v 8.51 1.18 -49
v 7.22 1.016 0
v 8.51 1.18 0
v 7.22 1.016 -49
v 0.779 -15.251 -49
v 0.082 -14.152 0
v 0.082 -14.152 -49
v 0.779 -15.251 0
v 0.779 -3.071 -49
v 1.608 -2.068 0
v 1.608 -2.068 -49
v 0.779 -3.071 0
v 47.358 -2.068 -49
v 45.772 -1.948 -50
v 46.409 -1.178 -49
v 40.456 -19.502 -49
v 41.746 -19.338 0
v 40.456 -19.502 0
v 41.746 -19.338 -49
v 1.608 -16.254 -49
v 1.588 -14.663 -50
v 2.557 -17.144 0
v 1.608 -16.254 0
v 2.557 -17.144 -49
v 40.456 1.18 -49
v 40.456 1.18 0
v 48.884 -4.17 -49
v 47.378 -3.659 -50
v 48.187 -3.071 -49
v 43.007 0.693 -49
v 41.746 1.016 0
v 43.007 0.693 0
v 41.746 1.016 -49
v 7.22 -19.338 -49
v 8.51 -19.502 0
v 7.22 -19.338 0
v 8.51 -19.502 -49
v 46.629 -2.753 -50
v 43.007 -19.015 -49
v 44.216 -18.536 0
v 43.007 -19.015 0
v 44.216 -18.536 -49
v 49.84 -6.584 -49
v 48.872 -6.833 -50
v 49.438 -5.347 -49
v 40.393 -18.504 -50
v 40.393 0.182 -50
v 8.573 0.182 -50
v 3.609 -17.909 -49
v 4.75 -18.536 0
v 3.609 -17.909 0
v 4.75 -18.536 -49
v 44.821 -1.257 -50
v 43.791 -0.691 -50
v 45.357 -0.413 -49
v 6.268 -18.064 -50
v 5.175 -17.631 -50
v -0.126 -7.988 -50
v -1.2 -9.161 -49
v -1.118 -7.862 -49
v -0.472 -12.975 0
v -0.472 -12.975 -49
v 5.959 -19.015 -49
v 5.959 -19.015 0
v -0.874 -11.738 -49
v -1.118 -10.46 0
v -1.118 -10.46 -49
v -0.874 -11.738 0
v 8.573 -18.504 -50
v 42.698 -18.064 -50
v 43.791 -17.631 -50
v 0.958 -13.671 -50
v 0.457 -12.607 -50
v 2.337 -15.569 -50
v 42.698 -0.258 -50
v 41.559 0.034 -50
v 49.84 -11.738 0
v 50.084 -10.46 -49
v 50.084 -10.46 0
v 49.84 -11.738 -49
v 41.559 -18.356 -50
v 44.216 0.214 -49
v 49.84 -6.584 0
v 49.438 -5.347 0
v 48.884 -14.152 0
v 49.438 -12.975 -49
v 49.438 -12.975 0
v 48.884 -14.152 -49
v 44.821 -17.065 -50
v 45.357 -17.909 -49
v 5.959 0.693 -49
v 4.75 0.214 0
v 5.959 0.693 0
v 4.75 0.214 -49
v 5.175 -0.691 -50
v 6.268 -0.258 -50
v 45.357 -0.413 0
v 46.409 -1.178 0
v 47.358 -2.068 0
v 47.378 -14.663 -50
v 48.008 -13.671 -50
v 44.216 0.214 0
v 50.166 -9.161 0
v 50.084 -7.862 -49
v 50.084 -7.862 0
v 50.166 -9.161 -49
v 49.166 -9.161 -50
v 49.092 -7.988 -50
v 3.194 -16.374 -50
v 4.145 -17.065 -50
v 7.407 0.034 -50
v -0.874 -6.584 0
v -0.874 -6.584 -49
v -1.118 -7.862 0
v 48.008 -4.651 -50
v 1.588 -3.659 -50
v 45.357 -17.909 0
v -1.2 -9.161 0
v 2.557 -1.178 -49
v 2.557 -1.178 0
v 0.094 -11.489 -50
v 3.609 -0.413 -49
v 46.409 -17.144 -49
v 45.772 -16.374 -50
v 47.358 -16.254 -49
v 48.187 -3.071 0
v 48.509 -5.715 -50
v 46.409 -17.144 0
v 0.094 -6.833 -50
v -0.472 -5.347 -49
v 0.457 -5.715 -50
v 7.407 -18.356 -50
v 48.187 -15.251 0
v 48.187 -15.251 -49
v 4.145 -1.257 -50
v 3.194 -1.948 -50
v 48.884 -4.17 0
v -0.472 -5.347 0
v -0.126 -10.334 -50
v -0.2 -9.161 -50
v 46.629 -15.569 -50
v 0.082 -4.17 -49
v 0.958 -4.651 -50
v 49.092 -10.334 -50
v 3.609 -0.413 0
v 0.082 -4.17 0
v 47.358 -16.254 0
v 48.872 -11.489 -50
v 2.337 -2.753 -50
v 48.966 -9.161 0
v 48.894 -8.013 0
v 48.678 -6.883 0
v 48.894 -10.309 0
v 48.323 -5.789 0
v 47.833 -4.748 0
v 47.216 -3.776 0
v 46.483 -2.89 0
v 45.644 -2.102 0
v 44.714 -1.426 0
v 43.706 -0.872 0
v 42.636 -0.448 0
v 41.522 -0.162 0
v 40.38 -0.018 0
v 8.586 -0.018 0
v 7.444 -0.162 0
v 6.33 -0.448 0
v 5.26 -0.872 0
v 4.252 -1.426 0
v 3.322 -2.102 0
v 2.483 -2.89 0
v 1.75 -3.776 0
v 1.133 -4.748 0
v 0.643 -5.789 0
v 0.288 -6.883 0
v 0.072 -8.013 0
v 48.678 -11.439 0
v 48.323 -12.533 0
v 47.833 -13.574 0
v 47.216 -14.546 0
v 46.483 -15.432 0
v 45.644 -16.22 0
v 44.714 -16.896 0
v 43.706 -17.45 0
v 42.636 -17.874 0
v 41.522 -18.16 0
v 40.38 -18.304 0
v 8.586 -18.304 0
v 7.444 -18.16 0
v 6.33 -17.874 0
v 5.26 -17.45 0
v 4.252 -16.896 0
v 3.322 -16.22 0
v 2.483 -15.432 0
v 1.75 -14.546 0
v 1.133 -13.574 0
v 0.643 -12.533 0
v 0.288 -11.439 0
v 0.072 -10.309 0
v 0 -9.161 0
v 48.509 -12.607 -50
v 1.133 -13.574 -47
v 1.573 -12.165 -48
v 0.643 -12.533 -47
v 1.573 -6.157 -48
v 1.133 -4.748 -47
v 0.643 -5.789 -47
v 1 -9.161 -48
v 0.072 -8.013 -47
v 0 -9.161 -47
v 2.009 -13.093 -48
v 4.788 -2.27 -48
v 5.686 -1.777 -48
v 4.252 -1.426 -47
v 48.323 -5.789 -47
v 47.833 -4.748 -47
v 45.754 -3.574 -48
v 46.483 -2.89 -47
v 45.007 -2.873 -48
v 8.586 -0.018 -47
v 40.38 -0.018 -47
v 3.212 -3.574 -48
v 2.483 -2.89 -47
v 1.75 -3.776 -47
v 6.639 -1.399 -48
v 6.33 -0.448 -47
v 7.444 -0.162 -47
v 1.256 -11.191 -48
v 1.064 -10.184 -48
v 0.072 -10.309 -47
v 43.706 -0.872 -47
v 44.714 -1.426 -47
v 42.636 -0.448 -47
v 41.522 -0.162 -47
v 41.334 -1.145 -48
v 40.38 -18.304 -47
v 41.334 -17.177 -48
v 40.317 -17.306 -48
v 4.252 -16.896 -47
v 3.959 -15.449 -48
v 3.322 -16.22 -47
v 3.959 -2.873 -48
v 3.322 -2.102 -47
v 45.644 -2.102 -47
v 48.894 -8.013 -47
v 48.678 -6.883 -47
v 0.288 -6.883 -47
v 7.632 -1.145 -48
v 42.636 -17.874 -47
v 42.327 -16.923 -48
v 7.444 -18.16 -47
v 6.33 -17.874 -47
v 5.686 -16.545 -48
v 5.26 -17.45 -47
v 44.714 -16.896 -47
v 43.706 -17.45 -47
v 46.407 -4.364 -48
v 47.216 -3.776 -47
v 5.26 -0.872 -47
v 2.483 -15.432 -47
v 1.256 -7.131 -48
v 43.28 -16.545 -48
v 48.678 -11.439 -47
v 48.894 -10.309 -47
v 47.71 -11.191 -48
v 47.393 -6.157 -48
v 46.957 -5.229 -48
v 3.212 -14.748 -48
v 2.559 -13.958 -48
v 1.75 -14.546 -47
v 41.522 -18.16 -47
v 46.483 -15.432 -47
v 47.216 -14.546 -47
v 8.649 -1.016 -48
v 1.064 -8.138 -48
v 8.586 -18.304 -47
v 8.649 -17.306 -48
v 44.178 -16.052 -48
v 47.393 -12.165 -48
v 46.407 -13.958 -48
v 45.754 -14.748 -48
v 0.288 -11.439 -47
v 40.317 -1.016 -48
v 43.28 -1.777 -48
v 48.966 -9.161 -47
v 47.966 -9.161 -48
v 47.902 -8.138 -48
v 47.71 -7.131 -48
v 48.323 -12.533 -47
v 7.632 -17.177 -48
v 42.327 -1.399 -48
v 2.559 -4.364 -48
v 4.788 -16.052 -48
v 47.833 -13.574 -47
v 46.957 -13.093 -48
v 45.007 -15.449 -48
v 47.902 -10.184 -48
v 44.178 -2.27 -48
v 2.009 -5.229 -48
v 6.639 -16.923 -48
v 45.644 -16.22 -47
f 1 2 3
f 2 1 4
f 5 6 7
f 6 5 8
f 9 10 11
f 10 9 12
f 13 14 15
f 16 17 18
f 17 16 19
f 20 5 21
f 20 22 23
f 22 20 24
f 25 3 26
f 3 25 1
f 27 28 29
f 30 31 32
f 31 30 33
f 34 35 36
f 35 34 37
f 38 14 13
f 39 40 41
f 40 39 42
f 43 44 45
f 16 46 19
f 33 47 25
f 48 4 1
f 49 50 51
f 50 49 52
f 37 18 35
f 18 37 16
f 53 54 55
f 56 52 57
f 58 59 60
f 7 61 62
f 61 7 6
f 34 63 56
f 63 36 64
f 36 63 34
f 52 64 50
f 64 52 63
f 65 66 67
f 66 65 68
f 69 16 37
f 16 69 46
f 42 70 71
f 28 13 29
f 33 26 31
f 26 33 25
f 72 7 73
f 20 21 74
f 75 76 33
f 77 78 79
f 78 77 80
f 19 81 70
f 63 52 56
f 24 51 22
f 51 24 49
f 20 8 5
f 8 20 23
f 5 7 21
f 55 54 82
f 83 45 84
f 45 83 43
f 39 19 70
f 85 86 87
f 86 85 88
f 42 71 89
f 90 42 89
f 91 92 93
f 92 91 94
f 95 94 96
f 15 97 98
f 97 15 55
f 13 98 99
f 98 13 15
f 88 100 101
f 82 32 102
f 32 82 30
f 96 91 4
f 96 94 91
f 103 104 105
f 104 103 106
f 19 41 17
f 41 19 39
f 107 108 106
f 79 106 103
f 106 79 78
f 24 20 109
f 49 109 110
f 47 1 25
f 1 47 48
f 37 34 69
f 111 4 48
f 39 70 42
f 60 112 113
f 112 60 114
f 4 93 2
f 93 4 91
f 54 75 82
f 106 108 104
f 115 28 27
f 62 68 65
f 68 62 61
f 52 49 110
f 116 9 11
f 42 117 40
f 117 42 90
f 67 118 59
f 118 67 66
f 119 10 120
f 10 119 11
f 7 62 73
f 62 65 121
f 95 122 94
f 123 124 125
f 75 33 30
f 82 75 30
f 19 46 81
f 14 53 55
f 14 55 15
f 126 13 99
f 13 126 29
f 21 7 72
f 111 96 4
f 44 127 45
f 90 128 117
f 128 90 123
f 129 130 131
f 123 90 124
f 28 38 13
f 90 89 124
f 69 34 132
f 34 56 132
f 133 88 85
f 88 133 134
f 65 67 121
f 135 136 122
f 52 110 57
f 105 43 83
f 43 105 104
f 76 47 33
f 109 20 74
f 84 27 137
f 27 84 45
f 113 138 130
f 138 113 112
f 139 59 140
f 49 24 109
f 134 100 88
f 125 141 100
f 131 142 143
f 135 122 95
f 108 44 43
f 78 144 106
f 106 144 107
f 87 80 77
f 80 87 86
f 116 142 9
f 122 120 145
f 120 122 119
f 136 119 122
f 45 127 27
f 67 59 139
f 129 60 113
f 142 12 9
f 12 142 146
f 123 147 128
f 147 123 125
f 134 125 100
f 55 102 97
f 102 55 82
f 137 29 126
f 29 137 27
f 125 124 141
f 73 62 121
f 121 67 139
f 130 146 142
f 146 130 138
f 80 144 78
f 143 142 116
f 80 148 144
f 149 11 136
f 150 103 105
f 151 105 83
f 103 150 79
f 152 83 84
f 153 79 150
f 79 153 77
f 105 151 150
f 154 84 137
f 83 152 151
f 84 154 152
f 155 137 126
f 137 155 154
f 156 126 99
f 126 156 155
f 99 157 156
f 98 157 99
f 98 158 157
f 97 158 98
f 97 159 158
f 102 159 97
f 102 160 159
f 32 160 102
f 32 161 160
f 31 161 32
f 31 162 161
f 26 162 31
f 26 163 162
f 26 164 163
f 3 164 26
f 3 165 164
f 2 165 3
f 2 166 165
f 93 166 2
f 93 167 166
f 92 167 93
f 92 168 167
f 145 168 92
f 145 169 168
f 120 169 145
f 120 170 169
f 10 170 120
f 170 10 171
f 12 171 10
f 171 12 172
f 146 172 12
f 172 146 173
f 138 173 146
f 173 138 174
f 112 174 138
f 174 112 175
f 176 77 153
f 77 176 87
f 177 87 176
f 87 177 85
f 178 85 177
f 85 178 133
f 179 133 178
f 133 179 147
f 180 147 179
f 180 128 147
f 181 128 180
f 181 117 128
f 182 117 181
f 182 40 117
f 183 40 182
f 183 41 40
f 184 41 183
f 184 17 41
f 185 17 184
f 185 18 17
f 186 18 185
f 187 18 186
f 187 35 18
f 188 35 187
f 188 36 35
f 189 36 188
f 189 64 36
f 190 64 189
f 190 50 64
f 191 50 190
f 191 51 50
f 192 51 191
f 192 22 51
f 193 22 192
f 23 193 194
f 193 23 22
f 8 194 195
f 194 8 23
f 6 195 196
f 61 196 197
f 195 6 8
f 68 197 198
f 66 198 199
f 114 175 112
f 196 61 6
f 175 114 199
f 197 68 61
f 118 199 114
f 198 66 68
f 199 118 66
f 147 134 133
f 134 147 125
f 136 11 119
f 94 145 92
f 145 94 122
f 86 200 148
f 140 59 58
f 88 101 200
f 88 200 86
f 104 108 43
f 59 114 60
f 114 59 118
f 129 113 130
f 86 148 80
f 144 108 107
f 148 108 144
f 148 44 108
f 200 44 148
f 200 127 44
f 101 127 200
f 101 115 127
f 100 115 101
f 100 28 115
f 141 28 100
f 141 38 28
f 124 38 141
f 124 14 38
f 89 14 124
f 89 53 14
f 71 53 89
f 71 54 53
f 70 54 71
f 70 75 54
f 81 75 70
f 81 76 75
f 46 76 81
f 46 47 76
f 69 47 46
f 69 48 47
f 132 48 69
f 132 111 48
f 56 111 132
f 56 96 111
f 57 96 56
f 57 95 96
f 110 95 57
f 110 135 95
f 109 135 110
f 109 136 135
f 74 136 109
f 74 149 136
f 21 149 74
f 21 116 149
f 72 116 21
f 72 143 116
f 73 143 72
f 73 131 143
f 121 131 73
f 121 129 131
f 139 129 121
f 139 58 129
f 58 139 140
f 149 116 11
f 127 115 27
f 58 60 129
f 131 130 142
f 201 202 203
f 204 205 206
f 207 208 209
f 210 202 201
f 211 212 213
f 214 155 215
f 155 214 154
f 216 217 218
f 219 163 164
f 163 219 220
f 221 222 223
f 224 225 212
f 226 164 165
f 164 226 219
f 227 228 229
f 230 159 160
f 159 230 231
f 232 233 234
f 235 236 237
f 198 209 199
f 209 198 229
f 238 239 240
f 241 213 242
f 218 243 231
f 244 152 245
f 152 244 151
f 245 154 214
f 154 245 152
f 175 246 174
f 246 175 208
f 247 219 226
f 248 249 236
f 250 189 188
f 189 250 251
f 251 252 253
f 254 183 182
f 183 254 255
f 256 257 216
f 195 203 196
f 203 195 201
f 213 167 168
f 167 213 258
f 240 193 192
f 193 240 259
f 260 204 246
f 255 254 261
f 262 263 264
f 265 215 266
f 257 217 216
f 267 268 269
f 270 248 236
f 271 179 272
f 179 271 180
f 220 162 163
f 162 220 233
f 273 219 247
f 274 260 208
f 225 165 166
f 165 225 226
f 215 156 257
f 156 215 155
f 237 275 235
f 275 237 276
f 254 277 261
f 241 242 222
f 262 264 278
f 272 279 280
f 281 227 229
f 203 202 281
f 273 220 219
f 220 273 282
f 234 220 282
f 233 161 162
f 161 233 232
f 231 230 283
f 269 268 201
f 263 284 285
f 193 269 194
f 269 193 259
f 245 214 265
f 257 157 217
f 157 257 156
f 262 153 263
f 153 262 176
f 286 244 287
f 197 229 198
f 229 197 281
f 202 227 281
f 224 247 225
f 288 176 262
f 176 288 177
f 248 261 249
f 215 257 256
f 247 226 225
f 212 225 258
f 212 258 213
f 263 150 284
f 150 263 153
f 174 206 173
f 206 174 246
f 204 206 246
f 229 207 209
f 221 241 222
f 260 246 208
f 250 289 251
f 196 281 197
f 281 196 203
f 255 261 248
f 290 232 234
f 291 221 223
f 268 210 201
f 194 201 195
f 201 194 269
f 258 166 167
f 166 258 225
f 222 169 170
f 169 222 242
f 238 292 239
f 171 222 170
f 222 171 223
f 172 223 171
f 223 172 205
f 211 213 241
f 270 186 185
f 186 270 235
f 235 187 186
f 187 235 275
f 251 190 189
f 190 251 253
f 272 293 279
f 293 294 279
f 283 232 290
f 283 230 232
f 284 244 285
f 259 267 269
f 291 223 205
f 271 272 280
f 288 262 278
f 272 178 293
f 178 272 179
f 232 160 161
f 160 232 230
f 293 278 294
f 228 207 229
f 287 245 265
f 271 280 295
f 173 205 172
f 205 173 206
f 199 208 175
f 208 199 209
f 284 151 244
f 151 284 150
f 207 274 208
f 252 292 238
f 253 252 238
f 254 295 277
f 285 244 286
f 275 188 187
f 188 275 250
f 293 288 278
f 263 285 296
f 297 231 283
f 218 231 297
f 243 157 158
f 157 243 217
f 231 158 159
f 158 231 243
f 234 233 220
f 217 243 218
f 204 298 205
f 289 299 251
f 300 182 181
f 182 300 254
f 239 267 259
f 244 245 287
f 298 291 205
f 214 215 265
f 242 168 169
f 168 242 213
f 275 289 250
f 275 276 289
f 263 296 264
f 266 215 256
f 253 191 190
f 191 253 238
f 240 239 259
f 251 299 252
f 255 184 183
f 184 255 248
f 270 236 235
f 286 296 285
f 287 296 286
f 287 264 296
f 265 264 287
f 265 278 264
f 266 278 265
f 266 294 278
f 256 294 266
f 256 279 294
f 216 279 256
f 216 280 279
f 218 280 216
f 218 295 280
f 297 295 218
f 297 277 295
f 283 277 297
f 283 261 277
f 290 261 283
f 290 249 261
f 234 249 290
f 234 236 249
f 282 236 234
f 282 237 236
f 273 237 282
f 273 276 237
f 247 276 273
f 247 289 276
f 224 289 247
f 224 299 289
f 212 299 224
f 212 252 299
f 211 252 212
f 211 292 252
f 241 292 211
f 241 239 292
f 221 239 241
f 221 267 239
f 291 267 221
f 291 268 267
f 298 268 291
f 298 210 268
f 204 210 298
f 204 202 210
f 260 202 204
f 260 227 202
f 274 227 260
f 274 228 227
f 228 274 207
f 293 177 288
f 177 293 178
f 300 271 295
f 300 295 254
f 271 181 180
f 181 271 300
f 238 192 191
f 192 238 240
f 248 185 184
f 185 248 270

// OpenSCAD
//Basic definition:
//Higher number = more faces = smoother model = slower processing.
$fn=50; 

//Case definition: 6.5x55 Swedish Mauser
//Base diameter of casing/rim 
d0=12.2; 

//Case scaling to allow oversized/fired cases
casescaling=1.01; 

//Block definition:
//Total number of cases you want
noOfCases=3;
//No of rows in the Y direction.
Rows=1;  
//Thickness of material outside hole
rim=3;  


//Total height of the lid.
height=50; 
//Lid thickness
lidthickness=2;
//Wall hickness
wallthickness=1.2;   
//Chamfer distance of the outside edge 0=no chamfer.
outerchamfer=1;

module corner(xpos,ypos,height,cornerradius,outerchamfer){
    translate([xpos,ypos,0])
    difference(){
      cylinder(h=height,r=cornerradius);
      translate([0,0,height])
         rotate_extrude(convexity=10)
             translate([cornerradius,0,0])
                circle(outerchamfer,$fn=4);  
    }   
}

function offset(rows)=(rows>1)?0:xoffset/2;

casesperrow=noOfCases/Rows; //No of cases in X direction. 

holediameter=d0*casescaling;
xoffset=holediameter+rim;
yoffset=xoffset*0.866;//Sqrt(3)/2=cos(30deg)
cornerradius=holediameter/2+rim;

x=xoffset*(casesperrow-0.5)+holediameter+2*rim-2*cornerradius;
y=yoffset*(Rows-1)+holediameter+2*rim-2*cornerradius;
rotate([180,0,0])
difference(){
    hull()
    translate([cornerradius,cornerradius,0]){
        corner(0,0,height,cornerradius+wallthickness,outerchamfer);
        corner(0,y,height,cornerradius+wallthickness,outerchamfer);
        corner(x-offset(Rows),0,height,cornerradius+wallthickness,outerchamfer);
        corner(x-offset(Rows),y,height,cornerradius+wallthickness,outerchamfer);
    }
    hull()
    translate([cornerradius,cornerradius,-lidthickness]){
        corner(0,0,height,cornerradius,outerchamfer);
        corner(0,y,height,cornerradius,outerchamfer);
        corner(x-offset(Rows),0,height,cornerradius,outerchamfer);
        corner(x-offset(Rows),y,height,cornerradius,outerchamfer);
    }
 
}

